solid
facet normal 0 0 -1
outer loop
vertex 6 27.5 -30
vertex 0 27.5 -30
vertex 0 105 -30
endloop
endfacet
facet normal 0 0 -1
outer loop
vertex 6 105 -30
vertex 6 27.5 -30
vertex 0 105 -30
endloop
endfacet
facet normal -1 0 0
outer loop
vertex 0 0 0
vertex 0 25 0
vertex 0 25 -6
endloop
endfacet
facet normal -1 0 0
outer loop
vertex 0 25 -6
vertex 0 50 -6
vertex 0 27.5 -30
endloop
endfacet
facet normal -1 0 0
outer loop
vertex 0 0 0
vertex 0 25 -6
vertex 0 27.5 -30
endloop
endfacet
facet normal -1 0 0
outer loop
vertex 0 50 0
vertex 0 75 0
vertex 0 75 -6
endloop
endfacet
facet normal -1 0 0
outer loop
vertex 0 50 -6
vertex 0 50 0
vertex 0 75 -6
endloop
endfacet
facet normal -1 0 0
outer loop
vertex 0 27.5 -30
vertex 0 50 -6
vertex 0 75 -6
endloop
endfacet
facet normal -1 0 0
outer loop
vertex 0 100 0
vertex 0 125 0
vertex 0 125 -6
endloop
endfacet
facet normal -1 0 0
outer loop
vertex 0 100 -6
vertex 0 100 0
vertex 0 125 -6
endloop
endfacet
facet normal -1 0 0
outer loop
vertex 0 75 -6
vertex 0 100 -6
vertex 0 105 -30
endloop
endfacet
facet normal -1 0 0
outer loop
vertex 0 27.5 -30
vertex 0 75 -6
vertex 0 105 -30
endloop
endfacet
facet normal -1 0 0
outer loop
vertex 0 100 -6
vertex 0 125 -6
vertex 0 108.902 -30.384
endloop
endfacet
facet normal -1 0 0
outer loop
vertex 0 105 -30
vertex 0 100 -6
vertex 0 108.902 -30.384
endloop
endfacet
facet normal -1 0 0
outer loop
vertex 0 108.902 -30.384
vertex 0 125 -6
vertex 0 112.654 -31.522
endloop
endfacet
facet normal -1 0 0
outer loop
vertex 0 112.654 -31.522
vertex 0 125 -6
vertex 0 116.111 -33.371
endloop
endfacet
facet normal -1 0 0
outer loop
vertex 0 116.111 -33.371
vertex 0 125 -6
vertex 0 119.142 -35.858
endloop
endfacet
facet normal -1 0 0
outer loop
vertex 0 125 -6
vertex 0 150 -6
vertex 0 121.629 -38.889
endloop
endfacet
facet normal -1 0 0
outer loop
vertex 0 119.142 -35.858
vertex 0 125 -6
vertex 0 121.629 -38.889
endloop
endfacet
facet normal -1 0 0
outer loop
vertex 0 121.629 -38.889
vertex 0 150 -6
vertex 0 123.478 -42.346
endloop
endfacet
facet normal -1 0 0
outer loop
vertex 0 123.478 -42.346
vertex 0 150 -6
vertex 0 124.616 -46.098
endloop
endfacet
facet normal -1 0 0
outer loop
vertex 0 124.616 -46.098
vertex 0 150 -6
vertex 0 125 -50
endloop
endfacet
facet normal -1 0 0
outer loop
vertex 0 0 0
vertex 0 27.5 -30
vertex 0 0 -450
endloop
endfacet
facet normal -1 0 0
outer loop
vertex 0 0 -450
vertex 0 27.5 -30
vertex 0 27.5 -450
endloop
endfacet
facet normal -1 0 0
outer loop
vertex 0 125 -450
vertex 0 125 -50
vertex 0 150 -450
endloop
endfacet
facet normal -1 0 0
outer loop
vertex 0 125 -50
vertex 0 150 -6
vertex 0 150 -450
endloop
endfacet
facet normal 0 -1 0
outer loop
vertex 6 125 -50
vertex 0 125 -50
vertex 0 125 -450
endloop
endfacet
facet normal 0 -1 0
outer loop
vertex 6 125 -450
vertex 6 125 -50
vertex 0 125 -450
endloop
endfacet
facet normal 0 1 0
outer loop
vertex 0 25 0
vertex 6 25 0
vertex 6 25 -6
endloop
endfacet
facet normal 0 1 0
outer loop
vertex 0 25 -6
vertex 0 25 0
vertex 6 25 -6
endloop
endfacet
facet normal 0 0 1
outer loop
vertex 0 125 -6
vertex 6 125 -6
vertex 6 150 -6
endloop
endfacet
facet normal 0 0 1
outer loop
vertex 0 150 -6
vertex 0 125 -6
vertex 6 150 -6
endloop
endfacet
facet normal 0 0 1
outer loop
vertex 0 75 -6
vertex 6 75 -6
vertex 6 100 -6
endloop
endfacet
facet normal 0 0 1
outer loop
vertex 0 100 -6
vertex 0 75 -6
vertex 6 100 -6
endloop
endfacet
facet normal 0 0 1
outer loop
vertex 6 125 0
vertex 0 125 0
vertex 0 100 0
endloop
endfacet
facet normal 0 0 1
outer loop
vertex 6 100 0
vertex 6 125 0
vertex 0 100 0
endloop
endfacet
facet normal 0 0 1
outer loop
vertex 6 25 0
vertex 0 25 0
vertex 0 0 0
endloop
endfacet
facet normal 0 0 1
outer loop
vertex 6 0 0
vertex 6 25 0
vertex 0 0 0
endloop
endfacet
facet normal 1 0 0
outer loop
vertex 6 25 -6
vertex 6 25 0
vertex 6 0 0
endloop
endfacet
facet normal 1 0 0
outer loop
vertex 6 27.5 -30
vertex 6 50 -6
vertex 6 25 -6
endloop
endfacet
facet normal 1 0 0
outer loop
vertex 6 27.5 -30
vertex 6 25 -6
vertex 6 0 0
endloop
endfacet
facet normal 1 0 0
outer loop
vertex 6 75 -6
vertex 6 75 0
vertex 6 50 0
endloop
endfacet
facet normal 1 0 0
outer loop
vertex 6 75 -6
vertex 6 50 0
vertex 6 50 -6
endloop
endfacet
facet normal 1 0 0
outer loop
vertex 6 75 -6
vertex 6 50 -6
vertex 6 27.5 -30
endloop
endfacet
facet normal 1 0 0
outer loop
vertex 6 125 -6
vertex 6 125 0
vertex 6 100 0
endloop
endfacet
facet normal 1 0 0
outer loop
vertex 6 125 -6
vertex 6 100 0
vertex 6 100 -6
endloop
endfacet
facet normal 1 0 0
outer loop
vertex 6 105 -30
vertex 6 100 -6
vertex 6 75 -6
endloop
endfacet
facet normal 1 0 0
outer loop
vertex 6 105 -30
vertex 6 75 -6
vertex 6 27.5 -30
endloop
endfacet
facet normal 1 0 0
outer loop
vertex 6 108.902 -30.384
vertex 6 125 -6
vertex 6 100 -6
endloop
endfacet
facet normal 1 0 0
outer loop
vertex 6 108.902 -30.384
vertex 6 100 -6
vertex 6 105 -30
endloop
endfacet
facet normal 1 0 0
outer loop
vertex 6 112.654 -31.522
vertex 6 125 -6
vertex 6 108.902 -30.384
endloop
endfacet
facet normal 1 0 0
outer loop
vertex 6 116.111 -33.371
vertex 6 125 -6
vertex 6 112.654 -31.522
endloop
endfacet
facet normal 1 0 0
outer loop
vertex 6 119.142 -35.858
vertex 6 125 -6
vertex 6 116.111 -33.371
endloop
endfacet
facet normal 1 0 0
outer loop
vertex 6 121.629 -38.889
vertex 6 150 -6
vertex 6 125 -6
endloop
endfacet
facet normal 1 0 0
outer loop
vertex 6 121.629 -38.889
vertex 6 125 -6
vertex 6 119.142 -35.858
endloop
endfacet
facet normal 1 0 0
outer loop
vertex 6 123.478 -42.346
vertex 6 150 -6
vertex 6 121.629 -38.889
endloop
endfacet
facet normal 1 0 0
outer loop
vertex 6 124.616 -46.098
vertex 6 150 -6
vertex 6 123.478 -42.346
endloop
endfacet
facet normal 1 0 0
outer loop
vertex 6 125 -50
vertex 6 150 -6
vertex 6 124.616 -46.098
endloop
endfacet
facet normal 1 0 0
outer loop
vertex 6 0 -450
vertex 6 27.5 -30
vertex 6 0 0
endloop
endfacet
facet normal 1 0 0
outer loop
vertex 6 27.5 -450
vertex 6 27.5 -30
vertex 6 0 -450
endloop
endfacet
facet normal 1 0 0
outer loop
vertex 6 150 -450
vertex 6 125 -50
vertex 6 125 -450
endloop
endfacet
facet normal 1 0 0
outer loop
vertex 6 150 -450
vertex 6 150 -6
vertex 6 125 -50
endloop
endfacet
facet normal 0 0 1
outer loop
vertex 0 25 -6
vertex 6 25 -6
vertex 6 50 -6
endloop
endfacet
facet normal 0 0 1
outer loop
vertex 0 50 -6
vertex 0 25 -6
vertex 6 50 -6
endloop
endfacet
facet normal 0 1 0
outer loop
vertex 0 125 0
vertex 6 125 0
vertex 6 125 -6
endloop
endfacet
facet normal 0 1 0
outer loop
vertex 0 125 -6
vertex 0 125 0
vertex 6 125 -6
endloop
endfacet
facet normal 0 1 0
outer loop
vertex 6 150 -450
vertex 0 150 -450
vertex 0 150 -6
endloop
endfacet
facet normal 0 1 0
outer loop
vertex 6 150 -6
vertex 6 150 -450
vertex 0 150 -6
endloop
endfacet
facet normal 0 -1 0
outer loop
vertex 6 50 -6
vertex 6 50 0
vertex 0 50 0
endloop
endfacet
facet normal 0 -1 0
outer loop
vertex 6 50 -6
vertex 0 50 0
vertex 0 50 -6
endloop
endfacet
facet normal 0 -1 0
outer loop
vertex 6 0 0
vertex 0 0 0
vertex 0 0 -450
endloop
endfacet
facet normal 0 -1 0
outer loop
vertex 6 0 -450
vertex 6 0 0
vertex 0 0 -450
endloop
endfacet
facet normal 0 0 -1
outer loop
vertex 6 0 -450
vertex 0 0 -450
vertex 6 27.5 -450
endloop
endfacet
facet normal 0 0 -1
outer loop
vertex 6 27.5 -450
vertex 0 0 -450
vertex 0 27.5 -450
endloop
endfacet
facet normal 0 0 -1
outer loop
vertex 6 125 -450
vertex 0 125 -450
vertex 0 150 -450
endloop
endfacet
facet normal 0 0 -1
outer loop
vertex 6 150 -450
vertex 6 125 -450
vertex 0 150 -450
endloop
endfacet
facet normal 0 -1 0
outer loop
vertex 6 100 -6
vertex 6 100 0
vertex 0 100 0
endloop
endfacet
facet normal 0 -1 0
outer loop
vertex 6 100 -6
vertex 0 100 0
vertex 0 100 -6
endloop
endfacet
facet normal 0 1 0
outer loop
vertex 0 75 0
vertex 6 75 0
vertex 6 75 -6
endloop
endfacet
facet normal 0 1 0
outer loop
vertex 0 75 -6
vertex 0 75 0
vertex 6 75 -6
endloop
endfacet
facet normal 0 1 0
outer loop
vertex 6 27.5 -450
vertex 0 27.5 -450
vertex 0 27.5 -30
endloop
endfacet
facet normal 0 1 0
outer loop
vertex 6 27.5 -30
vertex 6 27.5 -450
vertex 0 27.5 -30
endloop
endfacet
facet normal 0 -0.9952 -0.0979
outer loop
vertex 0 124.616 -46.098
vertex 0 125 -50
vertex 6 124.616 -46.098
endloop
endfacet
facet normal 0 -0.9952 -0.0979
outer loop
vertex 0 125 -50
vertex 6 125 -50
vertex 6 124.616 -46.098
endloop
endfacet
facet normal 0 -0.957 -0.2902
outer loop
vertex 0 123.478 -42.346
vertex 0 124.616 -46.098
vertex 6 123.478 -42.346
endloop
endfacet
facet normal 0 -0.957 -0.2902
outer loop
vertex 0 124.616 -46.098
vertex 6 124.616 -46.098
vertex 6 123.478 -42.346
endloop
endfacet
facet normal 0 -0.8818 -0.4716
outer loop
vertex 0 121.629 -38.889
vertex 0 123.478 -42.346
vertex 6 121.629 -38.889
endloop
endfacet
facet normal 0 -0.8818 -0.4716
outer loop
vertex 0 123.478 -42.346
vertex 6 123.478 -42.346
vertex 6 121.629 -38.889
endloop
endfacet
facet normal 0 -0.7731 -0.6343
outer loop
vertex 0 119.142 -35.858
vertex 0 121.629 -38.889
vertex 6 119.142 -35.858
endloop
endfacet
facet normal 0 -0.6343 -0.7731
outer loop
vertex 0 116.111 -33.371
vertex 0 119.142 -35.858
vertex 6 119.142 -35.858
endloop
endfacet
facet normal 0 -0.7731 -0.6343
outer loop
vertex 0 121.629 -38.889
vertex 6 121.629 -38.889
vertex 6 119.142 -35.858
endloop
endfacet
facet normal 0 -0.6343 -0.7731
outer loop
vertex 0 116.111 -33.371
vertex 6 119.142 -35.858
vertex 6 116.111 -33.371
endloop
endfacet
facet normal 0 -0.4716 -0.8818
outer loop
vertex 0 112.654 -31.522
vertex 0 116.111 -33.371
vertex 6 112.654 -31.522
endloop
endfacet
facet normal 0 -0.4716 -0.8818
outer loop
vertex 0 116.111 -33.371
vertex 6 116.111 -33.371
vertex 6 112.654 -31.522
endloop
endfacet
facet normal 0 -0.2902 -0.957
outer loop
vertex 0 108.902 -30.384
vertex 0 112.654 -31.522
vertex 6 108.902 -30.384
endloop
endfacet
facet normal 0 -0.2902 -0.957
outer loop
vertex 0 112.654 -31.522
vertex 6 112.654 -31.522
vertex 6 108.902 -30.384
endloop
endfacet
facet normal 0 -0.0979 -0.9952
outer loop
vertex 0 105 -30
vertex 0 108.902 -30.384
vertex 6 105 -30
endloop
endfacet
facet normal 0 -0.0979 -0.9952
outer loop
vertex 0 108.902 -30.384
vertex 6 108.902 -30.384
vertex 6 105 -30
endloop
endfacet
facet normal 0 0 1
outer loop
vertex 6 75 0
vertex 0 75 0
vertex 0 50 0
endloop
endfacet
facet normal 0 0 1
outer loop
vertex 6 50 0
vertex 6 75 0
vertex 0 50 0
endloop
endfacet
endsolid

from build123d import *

# Parameters (mm, degrees)
BOSS_EXTRUDE1_DEPTH = 6
SKETCH2_W           = 6
SKETCH2_H           = 25
CUT_EXTRUDE1_DEPTH  = 6
LPATTERN1_COUNT     = 3
LPATTERN1_PITCH     = 50
FILLET1_R           = 20


with BuildPart() as part:
    # Sketch1 → Boss-Extrude1 (new body)
    with BuildSketch(Plane(origin=(0, 0, 0), x_dir=(0, 0, -1), z_dir=(1, 0, 0))):
        Polygon((450, 125), (450, 150), (0, 150), (0, 0), (450, 0), (450, 27.5), (30, 27.5), (30, 125), align=None)
    extrude(amount=BOSS_EXTRUDE1_DEPTH)

    # Sketch2 → Cut-Extrude1 (cut)
    with BuildSketch(Plane(origin=(6, 0, 0), x_dir=(0, 0, -1), z_dir=(1, 0, 0))):
        with Locations((3, 137.5)):
            Rectangle(SKETCH2_W, SKETCH2_H)
    cut_extrude1 = extrude(amount=-CUT_EXTRUDE1_DEPTH, mode=Mode.SUBTRACT)

    # LPattern1: Cut-Extrude1 ×3
    with Locations(*[(0, -i * LPATTERN1_PITCH, 0) for i in range(1, LPATTERN1_COUNT)]):
        add(cut_extrude1, mode=Mode.SUBTRACT)

    # Fillet1
    fillet1_edges = [part.edges().sort_by_distance(p)[0] for p in [
        (3, 125, -30),
    ]]
    fillet(fillet1_edges, radius=FILLET1_R)


solid = part.part
